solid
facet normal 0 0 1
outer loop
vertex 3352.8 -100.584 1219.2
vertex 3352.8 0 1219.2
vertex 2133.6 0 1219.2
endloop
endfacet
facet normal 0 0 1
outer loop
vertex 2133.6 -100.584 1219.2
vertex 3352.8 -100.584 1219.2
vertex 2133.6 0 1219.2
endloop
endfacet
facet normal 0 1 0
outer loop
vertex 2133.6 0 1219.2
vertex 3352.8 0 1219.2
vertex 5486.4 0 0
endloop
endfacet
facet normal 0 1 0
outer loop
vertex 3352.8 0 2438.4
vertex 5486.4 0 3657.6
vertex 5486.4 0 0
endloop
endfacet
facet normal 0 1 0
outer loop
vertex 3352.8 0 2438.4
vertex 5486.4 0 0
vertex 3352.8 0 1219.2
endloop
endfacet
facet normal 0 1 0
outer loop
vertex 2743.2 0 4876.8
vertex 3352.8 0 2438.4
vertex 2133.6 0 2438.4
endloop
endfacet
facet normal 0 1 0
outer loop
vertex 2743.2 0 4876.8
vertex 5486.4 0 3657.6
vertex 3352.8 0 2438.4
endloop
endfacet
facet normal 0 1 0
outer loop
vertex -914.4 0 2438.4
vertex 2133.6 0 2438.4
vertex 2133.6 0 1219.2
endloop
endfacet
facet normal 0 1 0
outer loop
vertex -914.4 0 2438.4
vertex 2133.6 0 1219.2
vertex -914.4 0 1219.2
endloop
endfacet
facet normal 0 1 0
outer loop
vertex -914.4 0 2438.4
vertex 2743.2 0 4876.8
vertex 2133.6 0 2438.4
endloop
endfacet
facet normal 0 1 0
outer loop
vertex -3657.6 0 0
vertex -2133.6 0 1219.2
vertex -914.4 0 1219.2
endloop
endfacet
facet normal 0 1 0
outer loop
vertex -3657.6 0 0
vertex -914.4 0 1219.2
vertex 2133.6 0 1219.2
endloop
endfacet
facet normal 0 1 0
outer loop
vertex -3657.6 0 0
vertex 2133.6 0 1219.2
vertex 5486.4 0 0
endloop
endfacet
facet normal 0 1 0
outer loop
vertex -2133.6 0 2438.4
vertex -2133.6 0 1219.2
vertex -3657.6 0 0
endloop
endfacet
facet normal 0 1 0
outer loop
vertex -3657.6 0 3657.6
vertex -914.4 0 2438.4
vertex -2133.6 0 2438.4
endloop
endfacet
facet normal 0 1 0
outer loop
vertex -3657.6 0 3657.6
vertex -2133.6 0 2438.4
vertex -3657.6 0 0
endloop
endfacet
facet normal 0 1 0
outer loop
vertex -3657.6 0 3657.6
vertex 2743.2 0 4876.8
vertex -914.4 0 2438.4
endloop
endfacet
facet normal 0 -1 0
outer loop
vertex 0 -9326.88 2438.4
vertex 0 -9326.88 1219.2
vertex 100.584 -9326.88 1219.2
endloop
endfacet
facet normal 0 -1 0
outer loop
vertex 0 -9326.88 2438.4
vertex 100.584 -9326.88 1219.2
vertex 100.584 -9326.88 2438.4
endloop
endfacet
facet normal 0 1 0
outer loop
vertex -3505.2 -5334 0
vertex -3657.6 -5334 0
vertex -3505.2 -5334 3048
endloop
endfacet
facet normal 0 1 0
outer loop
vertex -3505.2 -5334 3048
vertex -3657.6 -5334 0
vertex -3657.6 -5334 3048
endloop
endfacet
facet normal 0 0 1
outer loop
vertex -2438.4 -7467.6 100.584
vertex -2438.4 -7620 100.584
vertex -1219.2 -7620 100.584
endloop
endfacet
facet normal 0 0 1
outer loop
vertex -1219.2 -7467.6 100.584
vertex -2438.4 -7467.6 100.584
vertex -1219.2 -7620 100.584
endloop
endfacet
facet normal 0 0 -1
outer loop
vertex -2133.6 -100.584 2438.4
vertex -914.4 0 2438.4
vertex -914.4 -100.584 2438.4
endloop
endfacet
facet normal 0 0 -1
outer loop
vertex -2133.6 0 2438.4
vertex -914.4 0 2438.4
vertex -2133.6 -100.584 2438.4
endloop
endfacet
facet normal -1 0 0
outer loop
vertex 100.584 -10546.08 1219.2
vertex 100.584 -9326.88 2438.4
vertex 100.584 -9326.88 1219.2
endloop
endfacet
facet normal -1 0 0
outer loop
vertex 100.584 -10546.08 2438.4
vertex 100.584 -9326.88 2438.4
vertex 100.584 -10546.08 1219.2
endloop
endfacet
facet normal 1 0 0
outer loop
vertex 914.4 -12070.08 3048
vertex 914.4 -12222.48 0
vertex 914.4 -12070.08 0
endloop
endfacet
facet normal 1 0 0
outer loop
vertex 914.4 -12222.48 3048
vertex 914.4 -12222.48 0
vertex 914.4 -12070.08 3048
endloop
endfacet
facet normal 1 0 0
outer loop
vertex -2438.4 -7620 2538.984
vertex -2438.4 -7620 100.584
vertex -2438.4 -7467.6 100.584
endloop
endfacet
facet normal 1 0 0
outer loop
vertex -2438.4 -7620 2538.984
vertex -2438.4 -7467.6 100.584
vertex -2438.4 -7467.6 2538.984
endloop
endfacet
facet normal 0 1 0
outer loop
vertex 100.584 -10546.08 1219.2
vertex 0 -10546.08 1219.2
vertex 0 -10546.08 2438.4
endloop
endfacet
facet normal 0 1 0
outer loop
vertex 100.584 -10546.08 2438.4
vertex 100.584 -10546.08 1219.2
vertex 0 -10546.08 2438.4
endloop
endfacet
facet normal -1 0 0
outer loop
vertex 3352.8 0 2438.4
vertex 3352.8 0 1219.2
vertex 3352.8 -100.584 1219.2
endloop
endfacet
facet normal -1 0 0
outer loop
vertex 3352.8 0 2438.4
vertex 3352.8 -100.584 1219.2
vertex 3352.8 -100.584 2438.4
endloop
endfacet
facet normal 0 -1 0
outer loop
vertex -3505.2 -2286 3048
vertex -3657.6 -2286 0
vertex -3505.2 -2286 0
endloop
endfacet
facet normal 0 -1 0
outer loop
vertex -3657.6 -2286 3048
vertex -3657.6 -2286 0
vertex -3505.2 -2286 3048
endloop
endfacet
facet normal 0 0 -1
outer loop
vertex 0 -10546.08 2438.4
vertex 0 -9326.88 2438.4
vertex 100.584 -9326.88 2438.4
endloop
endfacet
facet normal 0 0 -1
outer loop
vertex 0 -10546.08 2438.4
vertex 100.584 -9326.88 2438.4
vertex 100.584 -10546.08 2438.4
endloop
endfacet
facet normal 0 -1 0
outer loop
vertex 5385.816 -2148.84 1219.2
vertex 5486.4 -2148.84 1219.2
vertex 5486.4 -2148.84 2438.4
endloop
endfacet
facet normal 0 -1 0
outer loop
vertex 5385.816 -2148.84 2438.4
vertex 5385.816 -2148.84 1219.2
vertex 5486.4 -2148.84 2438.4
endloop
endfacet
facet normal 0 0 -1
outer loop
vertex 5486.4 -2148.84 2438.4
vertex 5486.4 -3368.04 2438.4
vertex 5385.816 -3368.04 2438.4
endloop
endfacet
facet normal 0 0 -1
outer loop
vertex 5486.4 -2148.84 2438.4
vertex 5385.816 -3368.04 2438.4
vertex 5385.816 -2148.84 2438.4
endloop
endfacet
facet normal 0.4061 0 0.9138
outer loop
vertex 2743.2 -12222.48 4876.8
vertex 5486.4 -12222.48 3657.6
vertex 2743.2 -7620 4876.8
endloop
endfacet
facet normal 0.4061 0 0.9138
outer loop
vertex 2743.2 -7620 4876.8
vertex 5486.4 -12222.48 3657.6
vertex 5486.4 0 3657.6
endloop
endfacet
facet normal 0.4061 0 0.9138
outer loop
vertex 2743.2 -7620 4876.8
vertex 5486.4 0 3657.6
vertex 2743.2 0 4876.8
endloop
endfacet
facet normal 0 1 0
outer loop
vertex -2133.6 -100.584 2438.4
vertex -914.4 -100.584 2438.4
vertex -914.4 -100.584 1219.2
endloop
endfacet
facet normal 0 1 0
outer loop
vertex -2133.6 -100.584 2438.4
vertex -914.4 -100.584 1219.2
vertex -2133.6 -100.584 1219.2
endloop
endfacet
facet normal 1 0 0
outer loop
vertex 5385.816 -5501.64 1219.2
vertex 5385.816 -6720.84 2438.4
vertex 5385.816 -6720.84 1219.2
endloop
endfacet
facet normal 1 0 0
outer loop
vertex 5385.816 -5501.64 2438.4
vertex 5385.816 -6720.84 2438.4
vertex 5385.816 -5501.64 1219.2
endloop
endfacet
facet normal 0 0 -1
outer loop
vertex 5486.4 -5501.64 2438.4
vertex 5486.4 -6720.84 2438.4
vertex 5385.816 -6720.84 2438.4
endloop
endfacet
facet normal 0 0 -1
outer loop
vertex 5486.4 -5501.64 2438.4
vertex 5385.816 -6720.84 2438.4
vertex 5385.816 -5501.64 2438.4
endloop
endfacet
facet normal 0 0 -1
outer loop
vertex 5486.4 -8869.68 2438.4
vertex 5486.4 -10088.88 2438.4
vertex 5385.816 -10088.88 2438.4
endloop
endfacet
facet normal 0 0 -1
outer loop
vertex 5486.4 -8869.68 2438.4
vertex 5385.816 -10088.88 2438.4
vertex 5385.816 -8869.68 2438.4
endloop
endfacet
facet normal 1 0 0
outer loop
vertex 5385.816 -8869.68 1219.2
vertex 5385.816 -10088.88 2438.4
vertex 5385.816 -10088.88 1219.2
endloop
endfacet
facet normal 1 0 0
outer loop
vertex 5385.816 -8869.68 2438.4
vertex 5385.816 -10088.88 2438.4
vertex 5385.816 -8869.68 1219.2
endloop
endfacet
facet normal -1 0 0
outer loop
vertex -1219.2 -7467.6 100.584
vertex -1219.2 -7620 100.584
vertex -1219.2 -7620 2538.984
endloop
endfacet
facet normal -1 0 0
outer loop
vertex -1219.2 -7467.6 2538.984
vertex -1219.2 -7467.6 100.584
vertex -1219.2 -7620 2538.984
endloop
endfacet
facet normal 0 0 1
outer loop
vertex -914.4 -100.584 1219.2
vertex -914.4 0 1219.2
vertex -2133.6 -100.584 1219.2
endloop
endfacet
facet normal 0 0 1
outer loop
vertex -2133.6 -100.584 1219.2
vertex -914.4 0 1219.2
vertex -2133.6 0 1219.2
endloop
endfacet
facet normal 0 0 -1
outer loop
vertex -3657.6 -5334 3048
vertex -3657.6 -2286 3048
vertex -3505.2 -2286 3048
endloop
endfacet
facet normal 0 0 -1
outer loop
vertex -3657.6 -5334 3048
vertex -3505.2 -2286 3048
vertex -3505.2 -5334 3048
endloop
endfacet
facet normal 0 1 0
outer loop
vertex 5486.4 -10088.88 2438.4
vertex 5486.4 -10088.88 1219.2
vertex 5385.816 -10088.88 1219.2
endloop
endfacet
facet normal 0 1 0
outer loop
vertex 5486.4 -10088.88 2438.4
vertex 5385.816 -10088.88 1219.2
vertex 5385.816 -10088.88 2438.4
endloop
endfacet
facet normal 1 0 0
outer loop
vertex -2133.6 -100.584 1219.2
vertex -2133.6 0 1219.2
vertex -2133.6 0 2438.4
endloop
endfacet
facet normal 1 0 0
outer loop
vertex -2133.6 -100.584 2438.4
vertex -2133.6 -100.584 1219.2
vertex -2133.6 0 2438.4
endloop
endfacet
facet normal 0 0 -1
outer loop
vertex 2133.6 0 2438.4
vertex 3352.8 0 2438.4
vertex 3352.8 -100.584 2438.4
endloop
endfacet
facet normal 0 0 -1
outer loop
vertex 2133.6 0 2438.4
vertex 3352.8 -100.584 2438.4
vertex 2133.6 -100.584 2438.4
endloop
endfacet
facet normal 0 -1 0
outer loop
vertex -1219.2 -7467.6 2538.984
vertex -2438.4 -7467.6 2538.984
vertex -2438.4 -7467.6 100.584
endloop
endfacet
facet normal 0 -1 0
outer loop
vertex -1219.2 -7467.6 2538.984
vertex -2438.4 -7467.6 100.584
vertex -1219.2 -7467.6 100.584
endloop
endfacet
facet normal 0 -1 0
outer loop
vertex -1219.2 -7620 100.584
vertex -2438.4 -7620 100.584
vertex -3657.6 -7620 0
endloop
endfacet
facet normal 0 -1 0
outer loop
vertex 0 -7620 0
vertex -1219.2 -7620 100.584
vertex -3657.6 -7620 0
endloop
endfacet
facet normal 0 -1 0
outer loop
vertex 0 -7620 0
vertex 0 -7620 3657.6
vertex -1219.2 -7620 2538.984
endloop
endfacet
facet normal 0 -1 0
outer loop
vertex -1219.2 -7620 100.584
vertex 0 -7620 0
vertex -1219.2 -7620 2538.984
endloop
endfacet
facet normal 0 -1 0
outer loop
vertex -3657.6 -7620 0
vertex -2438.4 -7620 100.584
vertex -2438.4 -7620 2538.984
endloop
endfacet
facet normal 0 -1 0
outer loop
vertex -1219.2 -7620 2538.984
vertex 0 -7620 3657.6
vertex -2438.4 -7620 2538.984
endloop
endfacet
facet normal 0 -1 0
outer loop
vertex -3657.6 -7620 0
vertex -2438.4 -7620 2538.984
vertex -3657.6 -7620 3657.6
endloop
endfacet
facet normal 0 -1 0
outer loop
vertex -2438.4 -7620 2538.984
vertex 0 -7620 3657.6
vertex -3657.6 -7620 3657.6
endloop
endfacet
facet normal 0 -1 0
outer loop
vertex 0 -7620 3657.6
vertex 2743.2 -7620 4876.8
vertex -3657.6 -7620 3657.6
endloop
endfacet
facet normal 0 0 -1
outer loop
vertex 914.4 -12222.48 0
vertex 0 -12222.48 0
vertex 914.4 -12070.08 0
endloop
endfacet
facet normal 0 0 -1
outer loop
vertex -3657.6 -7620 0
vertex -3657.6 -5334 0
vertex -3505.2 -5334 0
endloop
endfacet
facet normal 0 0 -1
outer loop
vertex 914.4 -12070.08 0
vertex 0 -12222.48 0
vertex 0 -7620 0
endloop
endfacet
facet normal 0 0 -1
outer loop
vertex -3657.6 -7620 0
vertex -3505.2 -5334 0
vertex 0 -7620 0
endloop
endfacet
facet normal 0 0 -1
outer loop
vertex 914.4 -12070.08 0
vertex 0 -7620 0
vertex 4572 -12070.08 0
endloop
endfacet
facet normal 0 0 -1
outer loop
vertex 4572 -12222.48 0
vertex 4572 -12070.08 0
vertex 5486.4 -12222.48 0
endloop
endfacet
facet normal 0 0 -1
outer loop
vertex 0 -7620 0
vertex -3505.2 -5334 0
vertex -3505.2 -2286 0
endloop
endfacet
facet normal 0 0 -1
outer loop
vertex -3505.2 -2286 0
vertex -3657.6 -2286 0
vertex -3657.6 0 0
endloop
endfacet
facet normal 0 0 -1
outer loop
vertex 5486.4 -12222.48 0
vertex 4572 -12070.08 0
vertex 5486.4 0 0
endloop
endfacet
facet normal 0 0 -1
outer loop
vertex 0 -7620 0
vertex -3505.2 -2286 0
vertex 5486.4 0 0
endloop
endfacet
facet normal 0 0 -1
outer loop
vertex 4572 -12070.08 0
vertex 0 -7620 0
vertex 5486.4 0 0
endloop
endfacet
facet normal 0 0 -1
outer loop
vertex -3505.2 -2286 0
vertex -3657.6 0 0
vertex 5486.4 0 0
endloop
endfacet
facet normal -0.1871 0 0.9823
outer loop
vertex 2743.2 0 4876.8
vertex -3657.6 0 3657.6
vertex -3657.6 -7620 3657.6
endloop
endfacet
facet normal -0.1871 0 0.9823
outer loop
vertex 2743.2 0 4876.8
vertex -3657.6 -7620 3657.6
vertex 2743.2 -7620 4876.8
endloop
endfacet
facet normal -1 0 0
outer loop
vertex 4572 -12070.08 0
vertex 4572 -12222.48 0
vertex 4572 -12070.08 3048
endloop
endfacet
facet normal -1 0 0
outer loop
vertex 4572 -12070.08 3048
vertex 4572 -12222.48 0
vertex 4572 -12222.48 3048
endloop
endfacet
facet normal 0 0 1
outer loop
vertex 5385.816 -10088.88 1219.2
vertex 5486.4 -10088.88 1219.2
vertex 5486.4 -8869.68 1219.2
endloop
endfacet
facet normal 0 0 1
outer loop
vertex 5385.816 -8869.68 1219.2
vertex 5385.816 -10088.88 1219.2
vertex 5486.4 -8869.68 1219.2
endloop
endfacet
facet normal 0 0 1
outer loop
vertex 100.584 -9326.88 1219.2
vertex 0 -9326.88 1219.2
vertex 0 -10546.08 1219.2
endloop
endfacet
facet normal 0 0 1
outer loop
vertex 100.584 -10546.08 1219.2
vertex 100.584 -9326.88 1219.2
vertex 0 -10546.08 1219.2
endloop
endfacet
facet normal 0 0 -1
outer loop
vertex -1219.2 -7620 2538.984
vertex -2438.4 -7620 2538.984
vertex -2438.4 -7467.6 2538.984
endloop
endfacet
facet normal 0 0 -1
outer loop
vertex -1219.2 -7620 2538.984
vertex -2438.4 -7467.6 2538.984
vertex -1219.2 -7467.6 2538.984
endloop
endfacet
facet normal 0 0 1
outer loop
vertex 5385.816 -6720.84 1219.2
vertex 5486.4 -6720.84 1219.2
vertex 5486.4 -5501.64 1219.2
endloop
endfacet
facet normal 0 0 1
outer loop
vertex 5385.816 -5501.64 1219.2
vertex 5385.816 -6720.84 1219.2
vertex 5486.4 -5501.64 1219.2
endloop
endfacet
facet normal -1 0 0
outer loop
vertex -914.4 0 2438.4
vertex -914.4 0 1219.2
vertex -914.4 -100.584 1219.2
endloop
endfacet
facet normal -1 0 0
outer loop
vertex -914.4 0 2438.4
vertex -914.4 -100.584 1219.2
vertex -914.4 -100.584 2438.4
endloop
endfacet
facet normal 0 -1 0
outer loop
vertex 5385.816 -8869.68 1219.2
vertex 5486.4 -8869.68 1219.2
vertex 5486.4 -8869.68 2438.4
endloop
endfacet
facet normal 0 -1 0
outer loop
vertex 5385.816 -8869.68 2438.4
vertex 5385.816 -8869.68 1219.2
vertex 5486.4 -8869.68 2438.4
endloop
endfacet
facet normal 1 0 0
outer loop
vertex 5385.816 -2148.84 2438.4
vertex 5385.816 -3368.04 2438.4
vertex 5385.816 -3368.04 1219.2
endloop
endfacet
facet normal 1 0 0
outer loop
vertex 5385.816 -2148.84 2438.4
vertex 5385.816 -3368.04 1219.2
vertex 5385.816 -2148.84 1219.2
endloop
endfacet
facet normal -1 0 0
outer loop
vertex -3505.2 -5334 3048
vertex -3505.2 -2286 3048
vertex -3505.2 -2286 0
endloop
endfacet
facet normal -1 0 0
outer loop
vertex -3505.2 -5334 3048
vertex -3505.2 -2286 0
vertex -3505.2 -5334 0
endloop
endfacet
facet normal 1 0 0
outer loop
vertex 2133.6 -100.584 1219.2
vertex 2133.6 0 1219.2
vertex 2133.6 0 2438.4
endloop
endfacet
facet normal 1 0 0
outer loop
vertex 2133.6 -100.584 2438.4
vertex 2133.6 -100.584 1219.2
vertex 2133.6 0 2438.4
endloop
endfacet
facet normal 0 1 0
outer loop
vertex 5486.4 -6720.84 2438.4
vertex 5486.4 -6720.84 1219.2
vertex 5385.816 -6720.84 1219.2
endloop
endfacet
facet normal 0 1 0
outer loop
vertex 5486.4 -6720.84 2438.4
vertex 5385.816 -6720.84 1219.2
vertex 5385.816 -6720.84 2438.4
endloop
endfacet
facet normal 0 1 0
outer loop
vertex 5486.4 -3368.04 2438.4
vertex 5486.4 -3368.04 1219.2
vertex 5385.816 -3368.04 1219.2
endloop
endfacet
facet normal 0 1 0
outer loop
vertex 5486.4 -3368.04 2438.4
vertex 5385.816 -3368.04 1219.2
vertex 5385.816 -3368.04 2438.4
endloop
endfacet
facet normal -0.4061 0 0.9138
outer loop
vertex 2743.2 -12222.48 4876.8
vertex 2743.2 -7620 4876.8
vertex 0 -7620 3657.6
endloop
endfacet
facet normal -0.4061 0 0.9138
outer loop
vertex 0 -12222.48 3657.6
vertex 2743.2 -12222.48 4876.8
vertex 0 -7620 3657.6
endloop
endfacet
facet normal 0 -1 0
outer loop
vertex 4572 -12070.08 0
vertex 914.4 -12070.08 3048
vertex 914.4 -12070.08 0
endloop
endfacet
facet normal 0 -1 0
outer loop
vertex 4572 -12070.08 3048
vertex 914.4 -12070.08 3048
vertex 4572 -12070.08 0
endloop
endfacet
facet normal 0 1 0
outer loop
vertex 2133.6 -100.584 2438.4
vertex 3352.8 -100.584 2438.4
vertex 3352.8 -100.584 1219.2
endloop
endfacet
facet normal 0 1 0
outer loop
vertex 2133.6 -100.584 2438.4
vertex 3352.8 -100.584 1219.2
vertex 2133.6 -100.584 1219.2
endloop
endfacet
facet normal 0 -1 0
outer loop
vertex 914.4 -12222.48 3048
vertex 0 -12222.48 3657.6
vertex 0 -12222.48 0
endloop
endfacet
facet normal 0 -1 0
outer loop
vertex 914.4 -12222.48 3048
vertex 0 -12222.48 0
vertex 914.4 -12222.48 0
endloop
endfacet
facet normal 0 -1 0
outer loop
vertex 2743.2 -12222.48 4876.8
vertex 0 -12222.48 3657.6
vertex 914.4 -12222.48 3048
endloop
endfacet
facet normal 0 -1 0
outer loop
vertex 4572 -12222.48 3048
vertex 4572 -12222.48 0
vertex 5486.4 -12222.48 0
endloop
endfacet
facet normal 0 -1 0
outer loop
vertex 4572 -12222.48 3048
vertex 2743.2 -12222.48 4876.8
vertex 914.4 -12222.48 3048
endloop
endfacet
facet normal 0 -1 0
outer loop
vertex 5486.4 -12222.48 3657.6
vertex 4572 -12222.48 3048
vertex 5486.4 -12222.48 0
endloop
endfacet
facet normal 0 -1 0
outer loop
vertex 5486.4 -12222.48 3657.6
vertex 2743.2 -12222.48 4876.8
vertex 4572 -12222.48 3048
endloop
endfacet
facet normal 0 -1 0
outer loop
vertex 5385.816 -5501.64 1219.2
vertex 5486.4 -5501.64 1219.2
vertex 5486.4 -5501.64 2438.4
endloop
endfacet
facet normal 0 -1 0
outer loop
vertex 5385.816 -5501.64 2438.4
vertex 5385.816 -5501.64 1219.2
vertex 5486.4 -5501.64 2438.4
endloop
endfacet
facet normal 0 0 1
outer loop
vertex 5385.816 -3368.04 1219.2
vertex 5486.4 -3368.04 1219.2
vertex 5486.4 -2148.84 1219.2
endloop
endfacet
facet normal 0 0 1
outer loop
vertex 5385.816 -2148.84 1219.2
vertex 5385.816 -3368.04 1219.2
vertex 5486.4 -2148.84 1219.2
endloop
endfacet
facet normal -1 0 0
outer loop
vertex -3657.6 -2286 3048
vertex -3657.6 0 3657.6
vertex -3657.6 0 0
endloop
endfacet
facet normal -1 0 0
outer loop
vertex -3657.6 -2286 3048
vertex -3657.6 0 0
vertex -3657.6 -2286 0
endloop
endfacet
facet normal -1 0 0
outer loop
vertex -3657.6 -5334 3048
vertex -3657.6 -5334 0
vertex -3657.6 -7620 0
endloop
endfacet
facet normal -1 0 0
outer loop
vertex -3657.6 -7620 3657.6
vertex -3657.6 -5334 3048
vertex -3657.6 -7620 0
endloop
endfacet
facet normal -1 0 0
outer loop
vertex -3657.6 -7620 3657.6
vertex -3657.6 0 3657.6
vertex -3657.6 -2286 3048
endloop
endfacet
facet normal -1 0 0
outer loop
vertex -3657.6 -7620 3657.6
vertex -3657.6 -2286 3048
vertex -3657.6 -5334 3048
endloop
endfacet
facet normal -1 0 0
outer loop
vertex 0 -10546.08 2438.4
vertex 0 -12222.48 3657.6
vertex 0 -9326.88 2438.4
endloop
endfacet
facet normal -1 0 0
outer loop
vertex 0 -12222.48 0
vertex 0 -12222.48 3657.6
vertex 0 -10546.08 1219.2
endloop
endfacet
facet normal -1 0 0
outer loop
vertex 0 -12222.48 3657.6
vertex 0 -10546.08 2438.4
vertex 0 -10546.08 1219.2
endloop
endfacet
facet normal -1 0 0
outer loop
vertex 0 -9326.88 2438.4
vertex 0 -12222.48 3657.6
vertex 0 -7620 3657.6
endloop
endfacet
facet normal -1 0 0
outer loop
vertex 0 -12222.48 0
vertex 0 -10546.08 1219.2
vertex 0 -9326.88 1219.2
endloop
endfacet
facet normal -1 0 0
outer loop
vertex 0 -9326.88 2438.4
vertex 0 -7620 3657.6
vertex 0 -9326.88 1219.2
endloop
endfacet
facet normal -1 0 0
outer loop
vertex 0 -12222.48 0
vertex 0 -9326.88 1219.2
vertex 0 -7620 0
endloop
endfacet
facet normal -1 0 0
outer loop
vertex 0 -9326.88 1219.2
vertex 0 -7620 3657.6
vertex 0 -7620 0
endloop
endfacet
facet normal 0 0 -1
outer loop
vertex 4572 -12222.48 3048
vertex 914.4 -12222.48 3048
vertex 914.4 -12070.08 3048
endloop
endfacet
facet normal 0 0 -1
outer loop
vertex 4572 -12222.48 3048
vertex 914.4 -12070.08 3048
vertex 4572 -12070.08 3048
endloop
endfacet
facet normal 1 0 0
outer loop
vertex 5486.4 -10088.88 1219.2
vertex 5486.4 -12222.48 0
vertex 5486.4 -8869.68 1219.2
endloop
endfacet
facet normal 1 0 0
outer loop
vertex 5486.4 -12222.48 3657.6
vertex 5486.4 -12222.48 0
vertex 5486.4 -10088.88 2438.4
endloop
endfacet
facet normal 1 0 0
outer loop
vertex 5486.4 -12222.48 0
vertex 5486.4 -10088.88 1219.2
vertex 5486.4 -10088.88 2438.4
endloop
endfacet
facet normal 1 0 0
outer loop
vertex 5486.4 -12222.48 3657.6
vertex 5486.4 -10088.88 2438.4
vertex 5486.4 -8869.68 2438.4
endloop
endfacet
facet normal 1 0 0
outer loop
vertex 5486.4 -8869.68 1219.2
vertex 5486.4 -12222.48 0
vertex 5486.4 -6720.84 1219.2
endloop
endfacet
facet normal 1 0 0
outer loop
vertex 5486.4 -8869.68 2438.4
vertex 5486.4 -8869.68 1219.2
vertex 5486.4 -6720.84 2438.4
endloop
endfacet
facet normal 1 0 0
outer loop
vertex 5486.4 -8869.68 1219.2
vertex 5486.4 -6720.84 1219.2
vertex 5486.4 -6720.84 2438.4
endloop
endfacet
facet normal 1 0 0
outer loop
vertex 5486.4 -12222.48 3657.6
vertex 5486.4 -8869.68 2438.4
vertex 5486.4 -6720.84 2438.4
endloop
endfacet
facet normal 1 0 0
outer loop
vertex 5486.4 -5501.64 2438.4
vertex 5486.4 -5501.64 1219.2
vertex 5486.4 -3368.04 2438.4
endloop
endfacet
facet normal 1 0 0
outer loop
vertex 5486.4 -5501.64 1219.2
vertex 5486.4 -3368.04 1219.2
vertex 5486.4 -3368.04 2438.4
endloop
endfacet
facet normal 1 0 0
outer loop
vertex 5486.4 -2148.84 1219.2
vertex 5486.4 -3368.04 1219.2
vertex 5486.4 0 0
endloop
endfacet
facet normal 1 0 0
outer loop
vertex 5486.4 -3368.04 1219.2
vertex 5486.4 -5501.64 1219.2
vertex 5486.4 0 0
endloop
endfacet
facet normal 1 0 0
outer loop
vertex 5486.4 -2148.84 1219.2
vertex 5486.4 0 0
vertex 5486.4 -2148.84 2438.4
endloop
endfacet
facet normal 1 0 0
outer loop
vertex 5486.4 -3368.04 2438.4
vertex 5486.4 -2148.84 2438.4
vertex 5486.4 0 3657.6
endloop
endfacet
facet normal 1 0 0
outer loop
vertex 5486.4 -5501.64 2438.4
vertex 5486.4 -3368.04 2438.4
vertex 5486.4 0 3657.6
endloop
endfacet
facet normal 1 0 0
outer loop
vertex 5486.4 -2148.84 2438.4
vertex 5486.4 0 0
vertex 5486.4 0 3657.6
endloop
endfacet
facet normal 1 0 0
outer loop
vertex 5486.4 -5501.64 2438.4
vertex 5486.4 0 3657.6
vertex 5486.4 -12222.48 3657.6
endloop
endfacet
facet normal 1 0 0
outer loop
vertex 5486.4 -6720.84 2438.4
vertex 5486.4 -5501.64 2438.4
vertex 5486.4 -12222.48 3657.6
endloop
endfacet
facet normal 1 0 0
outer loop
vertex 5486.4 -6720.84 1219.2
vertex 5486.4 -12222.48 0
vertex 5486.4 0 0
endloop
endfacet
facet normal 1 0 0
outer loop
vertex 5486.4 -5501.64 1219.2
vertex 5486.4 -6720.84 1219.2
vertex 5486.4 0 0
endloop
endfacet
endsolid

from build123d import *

# Parameters (mm, degrees)
F1_DEPTH      = 12192
F2_W          = 7620
F2_H          = 3657.6
F3_DEPTH      = 3657.6
F3_DEPTH_BACK = 2743.2
F4_DEPTH      = 30.48
F5_W          = 3657.6
F5_H          = 3048
F6_DEPTH      = 152.4
F7_W          = 3048
F7_H          = 3048
F8_DEPTH      = 152.4
F9_W          = 1219.2
F9_H          = 2438.4
F10_DEPTH     = 152.4
F11_W         = 1219.2
F11_H         = 1219.2
F12_DEPTH     = 100.584
F13_W         = 1219.2
F13_H         = 1219.2
F14_DEPTH     = 100.584
F15_W         = 1219.2
F15_H         = 1219.2
F16_DEPTH     = 100.584
F18_DEPTH     = 7620


with BuildPart() as f1:
    # F0 (on Front) → F1 (new body)
    with BuildSketch(Plane.XZ):
        Polygon((0, 3657.6), (0, 0), (5486.4, 0), (5486.4, 3657.6), (2743.2, 4876.8), align=None)
    extrude(amount=F1_DEPTH)

    # F2 (on face) → F3 (join, two sides)
    with BuildSketch(Plane(origin=(0, 0, 0), x_dir=(0, -1, 0), z_dir=(-1, 0, 0))) as f3_sk:
        with Locations((3810, 1828.8)):
            Rectangle(F2_W, F2_H)
    extrude(amount=F3_DEPTH)
    extrude(f3_sk.sketch, amount=-F3_DEPTH_BACK)

    # F4 (add): a face of the model
    f4_faces = [f1.faces().sort_by_distance(p)[0] for p in [
        (2743.2, -12192, 2148.1142857143),
    ]]
    extrude(f4_faces, amount=F4_DEPTH)

    # F5 (on face) → F6 (cut)
    with BuildSketch(Plane.XZ.offset(12222.48)):
        with Locations((2743.2, 1524)):
            Rectangle(F5_W, F5_H)
    extrude(amount=-F6_DEPTH, mode=Mode.SUBTRACT)

    # F7 (on face) → F8 (cut)
    with BuildSketch(Plane(origin=(-3657.6, 0, 0), x_dir=(0, -1, 0), z_dir=(-1, 0, 0))):
        with Locations((3810, 1524)):
            Rectangle(F7_W, F7_H)
    extrude(amount=-F8_DEPTH, mode=Mode.SUBTRACT)

    # F9 (on face) → F10 (cut)
    with BuildSketch(Plane.XZ.offset(7620)):
        with Locations((-1828.8, 1319.784)):
            Rectangle(F9_W, F9_H)
    extrude(amount=-F10_DEPTH, mode=Mode.SUBTRACT)

    # F11 (on face) → F12 (cut)
    with BuildSketch(Plane.YZ.offset(5486.4)):
        with Locations((-9479.28, 1828.8)):
            Rectangle(F11_W, F11_H)
        with Locations((-6111.24, 1828.8)):
            Rectangle(F11_W, F11_H)
        with Locations((-2758.44, 1828.8)):
            Rectangle(F11_W, F11_H)
    extrude(amount=-F12_DEPTH, mode=Mode.SUBTRACT)

    # F13 (on face) → F14 (cut)
    with BuildSketch(Plane(origin=(0, 0, 0), x_dir=(-1, 0, 0), z_dir=(0, 1, 0))):
        with Locations((-2743.2, 1828.8)):
            Rectangle(F13_W, F13_H)
        with Locations((1524, 1828.8)):
            Rectangle(F13_W, F13_H)
    extrude(amount=-F14_DEPTH, mode=Mode.SUBTRACT)

    # F15 (on face) → F16 (cut)
    with BuildSketch(Plane(origin=(0, 0, 0), x_dir=(0, -1, 0), z_dir=(-1, 0, 0))):
        with Locations((9936.48, 1828.8)):
            Rectangle(F15_W, F15_H)
    extrude(amount=-F16_DEPTH, mode=Mode.SUBTRACT)

    # F17 (on face) → F18 (join)
    with BuildSketch(Plane(origin=(0, 0, 0), x_dir=(-1, 0, 0), z_dir=(0, 1, 0))):
        Polygon((3657.6, 3657.6), (-2743.2, 4876.8), (0, 3657.6), align=None)
    extrude(amount=-F18_DEPTH)


solid = f1.part
